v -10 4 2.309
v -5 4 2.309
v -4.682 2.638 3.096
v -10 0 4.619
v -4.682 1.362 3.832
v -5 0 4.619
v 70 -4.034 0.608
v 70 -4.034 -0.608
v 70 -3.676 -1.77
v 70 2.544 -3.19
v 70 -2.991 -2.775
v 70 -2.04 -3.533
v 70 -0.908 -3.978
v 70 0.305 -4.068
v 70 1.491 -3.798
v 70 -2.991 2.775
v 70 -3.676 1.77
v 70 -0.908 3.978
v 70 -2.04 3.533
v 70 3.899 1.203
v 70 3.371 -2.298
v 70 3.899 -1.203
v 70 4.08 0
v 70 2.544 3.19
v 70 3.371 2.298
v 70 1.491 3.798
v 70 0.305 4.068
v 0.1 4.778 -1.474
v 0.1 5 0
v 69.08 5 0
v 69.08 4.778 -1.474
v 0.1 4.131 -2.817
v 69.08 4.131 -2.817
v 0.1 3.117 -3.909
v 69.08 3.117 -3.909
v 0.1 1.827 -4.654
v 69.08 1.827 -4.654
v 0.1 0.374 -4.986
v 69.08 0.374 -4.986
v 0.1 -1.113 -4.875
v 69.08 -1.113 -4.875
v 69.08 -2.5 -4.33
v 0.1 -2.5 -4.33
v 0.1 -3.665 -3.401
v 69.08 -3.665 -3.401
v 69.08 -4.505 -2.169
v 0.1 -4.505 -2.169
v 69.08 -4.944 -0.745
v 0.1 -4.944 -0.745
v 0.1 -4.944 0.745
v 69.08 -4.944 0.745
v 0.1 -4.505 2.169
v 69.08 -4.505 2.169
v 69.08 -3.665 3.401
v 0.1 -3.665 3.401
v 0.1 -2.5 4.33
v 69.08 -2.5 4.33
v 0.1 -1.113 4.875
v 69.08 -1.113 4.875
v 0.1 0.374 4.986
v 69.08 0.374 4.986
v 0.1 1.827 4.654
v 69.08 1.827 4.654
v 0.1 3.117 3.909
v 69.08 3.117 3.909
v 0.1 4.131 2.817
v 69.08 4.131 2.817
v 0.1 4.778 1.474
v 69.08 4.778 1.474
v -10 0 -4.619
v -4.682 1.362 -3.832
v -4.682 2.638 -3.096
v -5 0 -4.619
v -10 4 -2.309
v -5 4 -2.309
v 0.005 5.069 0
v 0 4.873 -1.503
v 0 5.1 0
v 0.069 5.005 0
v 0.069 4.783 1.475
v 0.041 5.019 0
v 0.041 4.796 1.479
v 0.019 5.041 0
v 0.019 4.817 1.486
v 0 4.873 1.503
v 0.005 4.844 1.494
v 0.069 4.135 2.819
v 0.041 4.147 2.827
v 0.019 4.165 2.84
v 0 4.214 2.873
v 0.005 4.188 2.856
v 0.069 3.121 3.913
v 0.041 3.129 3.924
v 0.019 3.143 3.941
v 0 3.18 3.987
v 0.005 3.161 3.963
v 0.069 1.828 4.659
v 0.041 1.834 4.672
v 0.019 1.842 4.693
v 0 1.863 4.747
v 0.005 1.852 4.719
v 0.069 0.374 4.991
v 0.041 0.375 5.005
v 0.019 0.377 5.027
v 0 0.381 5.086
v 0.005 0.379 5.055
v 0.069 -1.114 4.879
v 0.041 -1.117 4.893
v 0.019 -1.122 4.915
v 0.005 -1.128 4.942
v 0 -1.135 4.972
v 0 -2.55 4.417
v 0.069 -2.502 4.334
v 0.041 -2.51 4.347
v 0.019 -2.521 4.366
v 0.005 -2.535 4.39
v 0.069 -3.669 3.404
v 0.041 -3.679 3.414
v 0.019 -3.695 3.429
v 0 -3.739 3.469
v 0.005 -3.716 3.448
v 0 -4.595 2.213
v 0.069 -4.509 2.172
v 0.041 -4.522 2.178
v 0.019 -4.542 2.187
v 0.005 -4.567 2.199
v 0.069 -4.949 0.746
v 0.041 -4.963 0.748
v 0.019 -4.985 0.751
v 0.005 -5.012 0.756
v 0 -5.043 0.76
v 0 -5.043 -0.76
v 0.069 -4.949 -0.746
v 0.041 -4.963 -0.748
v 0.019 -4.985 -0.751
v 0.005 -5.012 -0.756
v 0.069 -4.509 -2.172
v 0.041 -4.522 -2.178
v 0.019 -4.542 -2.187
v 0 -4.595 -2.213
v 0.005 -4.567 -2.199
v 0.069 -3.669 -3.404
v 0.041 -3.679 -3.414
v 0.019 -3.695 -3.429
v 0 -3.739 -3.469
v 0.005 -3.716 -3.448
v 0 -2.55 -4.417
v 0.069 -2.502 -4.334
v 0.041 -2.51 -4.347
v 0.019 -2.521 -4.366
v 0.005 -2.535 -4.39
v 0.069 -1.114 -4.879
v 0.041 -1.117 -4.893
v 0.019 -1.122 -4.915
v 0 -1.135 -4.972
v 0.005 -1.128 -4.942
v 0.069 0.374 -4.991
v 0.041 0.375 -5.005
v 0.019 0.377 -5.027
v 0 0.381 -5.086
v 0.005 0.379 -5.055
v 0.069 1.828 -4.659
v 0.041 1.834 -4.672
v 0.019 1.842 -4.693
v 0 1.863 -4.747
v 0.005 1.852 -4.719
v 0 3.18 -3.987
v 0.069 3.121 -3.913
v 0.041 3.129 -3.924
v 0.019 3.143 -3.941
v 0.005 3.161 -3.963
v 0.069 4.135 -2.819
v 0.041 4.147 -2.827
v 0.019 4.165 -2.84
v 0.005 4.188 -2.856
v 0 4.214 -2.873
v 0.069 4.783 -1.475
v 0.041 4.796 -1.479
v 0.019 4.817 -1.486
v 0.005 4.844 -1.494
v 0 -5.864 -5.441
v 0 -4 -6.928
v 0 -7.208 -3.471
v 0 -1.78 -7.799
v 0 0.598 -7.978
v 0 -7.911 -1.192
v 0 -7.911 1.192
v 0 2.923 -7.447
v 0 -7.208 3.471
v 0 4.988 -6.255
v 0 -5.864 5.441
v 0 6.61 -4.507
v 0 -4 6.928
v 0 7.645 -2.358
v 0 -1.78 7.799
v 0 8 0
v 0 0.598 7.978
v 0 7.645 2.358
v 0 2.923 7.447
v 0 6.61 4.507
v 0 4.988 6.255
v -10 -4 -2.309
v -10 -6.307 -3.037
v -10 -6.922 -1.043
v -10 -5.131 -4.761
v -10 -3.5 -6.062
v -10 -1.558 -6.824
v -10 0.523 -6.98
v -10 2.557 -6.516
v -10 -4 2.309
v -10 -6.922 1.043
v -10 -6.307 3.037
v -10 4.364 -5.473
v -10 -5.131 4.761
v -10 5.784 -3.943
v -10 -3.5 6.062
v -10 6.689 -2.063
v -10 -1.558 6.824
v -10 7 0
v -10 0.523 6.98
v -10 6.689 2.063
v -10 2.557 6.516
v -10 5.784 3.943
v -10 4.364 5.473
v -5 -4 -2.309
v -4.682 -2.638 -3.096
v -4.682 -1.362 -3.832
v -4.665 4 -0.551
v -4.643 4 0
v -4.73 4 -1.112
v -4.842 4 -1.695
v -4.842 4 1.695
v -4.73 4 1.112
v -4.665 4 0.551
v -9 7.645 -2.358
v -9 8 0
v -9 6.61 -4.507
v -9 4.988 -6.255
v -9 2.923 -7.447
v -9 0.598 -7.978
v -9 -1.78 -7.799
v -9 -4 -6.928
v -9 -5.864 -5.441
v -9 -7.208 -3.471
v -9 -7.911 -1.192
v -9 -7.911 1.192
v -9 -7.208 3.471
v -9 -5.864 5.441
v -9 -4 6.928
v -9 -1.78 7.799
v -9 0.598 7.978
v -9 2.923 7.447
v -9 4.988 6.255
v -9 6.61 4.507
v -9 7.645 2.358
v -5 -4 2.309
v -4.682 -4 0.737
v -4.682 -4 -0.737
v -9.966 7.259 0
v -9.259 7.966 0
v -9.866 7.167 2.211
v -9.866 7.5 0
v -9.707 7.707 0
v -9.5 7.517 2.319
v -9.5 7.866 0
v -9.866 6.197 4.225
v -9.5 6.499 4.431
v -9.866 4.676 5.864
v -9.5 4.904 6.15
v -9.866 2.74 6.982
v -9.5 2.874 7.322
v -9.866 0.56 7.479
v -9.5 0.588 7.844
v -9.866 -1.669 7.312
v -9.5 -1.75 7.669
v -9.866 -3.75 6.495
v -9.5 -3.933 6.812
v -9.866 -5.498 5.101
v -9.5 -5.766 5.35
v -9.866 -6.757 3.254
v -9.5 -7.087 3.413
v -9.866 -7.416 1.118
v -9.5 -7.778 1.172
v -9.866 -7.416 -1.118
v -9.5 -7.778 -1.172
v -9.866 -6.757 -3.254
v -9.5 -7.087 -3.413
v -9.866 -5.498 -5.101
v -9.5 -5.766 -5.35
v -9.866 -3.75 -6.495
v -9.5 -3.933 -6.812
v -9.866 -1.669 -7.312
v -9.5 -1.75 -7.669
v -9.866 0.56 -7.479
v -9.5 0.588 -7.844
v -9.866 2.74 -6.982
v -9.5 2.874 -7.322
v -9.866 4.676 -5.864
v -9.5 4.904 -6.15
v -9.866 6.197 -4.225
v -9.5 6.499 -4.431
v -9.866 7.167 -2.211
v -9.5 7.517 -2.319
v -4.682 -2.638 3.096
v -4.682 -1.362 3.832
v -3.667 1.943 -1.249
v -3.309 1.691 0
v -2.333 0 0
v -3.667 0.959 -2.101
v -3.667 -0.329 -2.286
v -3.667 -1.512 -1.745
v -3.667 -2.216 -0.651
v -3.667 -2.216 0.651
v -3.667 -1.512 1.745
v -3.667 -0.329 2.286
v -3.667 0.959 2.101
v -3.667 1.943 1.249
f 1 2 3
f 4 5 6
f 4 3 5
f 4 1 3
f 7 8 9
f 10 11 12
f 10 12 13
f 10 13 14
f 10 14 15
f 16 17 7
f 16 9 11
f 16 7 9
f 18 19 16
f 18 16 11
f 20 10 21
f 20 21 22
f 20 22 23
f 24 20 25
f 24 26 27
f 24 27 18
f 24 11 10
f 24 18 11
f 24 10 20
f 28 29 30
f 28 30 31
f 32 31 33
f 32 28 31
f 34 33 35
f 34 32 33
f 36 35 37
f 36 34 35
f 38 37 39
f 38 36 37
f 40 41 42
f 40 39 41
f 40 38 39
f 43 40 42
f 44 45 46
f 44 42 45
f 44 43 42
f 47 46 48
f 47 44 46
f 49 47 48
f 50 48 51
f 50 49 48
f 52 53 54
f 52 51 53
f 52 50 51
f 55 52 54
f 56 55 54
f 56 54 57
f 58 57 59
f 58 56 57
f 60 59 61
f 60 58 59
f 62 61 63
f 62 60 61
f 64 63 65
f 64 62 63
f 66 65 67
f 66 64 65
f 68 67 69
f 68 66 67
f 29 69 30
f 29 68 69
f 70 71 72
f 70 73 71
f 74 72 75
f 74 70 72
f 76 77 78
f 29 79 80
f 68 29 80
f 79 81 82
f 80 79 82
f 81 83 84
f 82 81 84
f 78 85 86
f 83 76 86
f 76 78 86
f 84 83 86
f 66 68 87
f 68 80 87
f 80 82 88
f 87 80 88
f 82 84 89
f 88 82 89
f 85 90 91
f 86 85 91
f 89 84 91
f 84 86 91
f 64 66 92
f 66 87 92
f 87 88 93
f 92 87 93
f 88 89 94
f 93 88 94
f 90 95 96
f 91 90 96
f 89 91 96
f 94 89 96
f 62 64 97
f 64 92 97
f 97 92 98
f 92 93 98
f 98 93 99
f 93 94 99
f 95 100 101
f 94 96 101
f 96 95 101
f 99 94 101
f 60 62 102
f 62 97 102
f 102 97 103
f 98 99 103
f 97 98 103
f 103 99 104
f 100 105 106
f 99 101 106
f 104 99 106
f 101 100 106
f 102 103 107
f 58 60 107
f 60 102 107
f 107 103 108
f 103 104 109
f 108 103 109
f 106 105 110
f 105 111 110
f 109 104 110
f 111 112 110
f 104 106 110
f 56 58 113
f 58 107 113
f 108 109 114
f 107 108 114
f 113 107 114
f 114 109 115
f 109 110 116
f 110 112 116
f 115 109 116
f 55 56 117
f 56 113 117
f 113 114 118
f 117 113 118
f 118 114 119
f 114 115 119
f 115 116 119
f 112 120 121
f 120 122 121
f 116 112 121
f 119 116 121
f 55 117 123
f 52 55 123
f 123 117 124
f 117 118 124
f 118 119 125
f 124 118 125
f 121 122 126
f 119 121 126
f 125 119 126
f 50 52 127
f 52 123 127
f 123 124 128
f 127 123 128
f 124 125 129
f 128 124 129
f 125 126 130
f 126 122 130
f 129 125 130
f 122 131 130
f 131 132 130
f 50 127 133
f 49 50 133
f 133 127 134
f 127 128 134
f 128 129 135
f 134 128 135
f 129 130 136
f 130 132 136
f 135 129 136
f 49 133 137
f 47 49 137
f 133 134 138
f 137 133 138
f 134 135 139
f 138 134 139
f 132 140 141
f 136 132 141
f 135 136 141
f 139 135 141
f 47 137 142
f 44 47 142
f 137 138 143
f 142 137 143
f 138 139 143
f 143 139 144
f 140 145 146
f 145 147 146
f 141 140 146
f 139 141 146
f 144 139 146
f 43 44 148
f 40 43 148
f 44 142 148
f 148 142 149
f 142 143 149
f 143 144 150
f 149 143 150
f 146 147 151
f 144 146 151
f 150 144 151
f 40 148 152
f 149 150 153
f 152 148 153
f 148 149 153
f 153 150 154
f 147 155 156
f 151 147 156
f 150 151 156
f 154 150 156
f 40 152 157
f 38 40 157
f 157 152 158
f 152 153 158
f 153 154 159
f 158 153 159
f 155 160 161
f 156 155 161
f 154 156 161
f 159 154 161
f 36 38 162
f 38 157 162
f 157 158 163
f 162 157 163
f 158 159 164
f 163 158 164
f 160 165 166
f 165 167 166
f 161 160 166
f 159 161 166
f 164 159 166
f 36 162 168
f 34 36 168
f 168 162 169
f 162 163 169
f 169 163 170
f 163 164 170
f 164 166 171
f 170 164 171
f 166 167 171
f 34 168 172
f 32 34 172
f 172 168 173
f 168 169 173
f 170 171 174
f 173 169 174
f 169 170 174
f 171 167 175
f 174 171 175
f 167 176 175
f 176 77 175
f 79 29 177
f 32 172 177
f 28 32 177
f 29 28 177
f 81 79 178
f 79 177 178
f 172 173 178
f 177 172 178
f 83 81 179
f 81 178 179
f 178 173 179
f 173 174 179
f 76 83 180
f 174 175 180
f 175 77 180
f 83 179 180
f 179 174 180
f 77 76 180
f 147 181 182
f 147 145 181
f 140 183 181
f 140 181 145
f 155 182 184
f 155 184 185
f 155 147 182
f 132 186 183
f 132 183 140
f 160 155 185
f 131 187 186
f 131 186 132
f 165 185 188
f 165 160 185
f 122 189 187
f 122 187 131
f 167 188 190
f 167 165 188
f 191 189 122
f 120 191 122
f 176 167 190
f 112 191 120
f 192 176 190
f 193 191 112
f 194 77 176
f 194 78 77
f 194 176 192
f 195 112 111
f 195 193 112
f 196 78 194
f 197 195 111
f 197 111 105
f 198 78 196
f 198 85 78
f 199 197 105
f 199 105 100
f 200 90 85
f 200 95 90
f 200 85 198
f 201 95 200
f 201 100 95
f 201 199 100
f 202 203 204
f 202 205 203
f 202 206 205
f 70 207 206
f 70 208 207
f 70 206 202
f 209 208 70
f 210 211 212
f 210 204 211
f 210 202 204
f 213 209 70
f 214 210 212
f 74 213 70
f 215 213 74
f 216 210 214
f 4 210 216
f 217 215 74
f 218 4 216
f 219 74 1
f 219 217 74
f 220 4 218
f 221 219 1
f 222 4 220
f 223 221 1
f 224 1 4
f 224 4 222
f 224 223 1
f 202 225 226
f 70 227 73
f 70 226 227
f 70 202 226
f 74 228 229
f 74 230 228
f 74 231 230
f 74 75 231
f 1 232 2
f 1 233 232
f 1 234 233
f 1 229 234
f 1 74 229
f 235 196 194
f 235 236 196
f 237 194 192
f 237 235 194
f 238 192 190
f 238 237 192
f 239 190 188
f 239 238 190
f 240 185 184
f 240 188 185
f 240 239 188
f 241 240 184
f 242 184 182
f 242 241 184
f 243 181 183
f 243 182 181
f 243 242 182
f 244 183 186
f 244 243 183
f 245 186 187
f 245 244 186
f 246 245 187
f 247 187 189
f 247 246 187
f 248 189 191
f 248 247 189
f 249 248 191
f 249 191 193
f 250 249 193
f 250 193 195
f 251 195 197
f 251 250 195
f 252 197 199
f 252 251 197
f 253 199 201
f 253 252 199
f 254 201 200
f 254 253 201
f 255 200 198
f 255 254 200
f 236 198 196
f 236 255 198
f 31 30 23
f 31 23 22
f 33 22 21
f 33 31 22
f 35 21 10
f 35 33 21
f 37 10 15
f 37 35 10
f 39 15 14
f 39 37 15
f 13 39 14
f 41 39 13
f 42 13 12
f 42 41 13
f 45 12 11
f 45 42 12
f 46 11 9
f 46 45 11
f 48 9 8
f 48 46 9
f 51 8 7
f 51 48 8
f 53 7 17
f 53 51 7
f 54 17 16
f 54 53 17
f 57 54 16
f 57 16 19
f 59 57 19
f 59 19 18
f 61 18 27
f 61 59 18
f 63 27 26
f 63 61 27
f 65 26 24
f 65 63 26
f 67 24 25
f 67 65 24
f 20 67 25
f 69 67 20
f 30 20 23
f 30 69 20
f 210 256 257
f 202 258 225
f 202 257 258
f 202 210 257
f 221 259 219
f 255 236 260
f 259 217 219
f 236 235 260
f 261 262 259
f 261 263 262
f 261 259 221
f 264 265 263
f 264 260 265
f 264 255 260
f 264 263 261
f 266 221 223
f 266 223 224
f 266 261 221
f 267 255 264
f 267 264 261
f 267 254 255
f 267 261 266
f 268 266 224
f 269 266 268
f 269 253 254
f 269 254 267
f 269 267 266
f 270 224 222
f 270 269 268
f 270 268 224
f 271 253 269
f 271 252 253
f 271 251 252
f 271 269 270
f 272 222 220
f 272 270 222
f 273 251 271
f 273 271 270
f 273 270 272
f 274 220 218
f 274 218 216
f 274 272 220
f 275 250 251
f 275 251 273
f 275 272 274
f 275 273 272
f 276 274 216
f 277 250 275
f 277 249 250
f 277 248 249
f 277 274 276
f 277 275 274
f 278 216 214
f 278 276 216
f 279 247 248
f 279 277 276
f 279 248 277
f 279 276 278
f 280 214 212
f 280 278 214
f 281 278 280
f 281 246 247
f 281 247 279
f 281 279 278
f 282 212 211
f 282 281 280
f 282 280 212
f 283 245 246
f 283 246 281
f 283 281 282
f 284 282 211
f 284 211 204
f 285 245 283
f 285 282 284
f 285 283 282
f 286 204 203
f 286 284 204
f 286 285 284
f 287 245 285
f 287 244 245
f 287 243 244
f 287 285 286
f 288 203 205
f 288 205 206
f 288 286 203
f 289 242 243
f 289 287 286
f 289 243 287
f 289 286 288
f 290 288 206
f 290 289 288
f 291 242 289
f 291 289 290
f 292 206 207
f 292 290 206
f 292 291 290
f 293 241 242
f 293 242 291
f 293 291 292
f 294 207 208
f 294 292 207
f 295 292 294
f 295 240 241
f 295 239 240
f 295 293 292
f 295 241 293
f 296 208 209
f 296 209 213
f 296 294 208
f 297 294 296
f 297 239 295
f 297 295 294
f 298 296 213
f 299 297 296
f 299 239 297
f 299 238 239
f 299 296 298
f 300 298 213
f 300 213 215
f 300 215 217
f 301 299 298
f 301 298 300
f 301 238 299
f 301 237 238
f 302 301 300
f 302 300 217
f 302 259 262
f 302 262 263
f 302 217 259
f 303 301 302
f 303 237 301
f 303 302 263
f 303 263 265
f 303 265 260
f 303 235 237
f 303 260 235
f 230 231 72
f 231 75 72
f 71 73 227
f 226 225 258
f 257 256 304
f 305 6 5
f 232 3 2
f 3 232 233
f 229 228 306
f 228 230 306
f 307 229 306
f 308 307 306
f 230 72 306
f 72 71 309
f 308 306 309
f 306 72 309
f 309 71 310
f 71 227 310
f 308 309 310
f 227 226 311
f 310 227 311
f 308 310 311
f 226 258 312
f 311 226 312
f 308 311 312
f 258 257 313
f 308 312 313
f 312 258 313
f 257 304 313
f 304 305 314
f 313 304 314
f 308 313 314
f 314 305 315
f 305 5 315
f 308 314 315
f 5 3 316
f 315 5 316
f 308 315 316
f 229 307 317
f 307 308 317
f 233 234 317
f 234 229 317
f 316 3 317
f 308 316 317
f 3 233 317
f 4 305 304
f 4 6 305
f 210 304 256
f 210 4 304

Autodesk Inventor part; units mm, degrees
ref_plane "YZ Plane" through (0, 0, 0) normal (1, 0, 0) x (0, 1, 0)
ref_plane "XZ Plane" through (0, 0, 0) normal (0, 1, 0) x (-1, 0, 0)
sketch "Эскиз1" plane through (0, 0, 0) normal (0, 0, 1) x (1, 0, 0)
  line L0 (-2.3333, 0) -> (70, 0)
  line L1 (70, 0) -> (70, 5)
  line L2 (70, 5) -> (44, 5)
  line L3 (44, 5) -> (43.0797, 5)
  line L4 (43.0797, 5) -> (0, 5)
  line L5 (0, 5) -> (0, 8)
  line L6 (0, 8) -> (-10, 8)
  line L7 (-10, 8) -> (-10, 4.6188)
  line L8 (-10, 4.6188) -> (-5, 4.6188)
  line L9 (-5, 4.6188) -> (-2.3333, 0)
  line L10 (-26, 0) -> (86, 0) projected
  line L11 (0, -1.6) -> (0, 9.6) projected
  line L12 (44, 5) -> (0, 5) construction
  dimension "d1" = 26
  dimension "d2" = 0.9203
  dimension "d3" = 10
  dimension "d4" = 5
  dimension "d5" = 60
  dimension "d6" = 10
  dimension "d7" = 10
  dimension "d8" = 9.2376
  dimension "d9" = 16
  dimension "d26" = 70
revolve "Базовый элемент" add sketch "Эскиз1" angle 360 about axis through (-2.3333, 0, 0) along (1, 0, 0)
sketch "Эскиз2" plane through (-10, 0, 0) normal (-1, 0, 0) x (0, 0, 1)
  circle A0 centre (0, 0) radius 4.6188 projected
  line L0 (0, -11.2) -> (0, 11.2) projected
  line L1 (-11.2, 0) -> (11.2, 0) projected
  line L2 (4.6188, 0) -> (2.3094, -4)
  line L3 (2.3094, -4) -> (-2.3094, -4)
  line L4 (-2.3094, -4) -> (-4.6188, 0)
  line L5 (-4.6188, 0) -> (-2.3094, 4)
  line L6 (-2.3094, 4) -> (2.3094, 4)
  line L7 (2.3094, 4) -> (4.6188, 0)
extrude "Паз" add sketch "Эскиз2" against normal up to next contours L7 A0 | A0 L2 | L6 L0 A0 | A0 L0 L3 | L0 L6 A0 | A0 L3 L0 | L4 A0 | A0 L5
fillet "Сопряжение1" radius 1 1 edges at (-10, -8, 0)
thread "Резьба" size "M10x1.5" class "6g" standard "ISO Metric profile" length 26
chamfer "Фаска1" distance 0.9202 distance2 0.9202 1 edges at (70, -5, 0) measured on face at (70, -1.8775, -0.7745)
ref_plane "Work Plane1" through (29, 0, 0) normal (0, -1, 0) x (1, 0, 0)
fillet "Fillet2" radius 0.1 1 edges at (0, -5, 0)
equation "\"d1\" = GEL"
equation "\"d3\" = KOH"
equation "\"d4\" = INTI"
equation "\"d6\" = GD"
equation "\"d7\" = BDM"
equation "\"d8\" = 1.1547 * SW"
equation "\"d9\" = KOD"
equation "\"d30\" = R"
equation "\"d17\" = RR"
equation "\"d13\" = GEL"
equation "\"d15\" = -0.5 * SPD + 0.5 * GD"
equation "\"d16\" = GUL"
equation "\"GD\" = NND"
equation "\"NLG\" = 75"
equation "\"GEL\" = 26"
equation "\"KOD\" = 16"
equation "\"KOH\" = NND"
equation "\"INTI\" = 5"
equation "\"GAL\" = 0.61345 * PTC"
equation "\"GUL\" = 0.61345 * PTC"
equation "\"BDM\" = NND"
equation "\"SW\" = 8"
equation "\"RR\" = 0.1 * NND"
equation "\"SPD\" = NND - 1.2269 * PTC"
equation "\"R\" = 0.1"
equation "\"PHH\" = 0.2"
equation "\"GD1\" = THREADDIA - 1.2269 * PTC"
equation "\"FAWI\" = 45deg"
equation "\"PTC\" = 1.5"
equation "\"KOH1\" = 9"
equation "\"TOA\" = 30deg"
equation "\"E0\" = 1.155 * SW"
equation "\"NND\" = 10"
equation "\"THREADDIA\" = 10"
properties part number "AS 1420 - 1973 - M10 x 75" material "Сталь, мягкая"
